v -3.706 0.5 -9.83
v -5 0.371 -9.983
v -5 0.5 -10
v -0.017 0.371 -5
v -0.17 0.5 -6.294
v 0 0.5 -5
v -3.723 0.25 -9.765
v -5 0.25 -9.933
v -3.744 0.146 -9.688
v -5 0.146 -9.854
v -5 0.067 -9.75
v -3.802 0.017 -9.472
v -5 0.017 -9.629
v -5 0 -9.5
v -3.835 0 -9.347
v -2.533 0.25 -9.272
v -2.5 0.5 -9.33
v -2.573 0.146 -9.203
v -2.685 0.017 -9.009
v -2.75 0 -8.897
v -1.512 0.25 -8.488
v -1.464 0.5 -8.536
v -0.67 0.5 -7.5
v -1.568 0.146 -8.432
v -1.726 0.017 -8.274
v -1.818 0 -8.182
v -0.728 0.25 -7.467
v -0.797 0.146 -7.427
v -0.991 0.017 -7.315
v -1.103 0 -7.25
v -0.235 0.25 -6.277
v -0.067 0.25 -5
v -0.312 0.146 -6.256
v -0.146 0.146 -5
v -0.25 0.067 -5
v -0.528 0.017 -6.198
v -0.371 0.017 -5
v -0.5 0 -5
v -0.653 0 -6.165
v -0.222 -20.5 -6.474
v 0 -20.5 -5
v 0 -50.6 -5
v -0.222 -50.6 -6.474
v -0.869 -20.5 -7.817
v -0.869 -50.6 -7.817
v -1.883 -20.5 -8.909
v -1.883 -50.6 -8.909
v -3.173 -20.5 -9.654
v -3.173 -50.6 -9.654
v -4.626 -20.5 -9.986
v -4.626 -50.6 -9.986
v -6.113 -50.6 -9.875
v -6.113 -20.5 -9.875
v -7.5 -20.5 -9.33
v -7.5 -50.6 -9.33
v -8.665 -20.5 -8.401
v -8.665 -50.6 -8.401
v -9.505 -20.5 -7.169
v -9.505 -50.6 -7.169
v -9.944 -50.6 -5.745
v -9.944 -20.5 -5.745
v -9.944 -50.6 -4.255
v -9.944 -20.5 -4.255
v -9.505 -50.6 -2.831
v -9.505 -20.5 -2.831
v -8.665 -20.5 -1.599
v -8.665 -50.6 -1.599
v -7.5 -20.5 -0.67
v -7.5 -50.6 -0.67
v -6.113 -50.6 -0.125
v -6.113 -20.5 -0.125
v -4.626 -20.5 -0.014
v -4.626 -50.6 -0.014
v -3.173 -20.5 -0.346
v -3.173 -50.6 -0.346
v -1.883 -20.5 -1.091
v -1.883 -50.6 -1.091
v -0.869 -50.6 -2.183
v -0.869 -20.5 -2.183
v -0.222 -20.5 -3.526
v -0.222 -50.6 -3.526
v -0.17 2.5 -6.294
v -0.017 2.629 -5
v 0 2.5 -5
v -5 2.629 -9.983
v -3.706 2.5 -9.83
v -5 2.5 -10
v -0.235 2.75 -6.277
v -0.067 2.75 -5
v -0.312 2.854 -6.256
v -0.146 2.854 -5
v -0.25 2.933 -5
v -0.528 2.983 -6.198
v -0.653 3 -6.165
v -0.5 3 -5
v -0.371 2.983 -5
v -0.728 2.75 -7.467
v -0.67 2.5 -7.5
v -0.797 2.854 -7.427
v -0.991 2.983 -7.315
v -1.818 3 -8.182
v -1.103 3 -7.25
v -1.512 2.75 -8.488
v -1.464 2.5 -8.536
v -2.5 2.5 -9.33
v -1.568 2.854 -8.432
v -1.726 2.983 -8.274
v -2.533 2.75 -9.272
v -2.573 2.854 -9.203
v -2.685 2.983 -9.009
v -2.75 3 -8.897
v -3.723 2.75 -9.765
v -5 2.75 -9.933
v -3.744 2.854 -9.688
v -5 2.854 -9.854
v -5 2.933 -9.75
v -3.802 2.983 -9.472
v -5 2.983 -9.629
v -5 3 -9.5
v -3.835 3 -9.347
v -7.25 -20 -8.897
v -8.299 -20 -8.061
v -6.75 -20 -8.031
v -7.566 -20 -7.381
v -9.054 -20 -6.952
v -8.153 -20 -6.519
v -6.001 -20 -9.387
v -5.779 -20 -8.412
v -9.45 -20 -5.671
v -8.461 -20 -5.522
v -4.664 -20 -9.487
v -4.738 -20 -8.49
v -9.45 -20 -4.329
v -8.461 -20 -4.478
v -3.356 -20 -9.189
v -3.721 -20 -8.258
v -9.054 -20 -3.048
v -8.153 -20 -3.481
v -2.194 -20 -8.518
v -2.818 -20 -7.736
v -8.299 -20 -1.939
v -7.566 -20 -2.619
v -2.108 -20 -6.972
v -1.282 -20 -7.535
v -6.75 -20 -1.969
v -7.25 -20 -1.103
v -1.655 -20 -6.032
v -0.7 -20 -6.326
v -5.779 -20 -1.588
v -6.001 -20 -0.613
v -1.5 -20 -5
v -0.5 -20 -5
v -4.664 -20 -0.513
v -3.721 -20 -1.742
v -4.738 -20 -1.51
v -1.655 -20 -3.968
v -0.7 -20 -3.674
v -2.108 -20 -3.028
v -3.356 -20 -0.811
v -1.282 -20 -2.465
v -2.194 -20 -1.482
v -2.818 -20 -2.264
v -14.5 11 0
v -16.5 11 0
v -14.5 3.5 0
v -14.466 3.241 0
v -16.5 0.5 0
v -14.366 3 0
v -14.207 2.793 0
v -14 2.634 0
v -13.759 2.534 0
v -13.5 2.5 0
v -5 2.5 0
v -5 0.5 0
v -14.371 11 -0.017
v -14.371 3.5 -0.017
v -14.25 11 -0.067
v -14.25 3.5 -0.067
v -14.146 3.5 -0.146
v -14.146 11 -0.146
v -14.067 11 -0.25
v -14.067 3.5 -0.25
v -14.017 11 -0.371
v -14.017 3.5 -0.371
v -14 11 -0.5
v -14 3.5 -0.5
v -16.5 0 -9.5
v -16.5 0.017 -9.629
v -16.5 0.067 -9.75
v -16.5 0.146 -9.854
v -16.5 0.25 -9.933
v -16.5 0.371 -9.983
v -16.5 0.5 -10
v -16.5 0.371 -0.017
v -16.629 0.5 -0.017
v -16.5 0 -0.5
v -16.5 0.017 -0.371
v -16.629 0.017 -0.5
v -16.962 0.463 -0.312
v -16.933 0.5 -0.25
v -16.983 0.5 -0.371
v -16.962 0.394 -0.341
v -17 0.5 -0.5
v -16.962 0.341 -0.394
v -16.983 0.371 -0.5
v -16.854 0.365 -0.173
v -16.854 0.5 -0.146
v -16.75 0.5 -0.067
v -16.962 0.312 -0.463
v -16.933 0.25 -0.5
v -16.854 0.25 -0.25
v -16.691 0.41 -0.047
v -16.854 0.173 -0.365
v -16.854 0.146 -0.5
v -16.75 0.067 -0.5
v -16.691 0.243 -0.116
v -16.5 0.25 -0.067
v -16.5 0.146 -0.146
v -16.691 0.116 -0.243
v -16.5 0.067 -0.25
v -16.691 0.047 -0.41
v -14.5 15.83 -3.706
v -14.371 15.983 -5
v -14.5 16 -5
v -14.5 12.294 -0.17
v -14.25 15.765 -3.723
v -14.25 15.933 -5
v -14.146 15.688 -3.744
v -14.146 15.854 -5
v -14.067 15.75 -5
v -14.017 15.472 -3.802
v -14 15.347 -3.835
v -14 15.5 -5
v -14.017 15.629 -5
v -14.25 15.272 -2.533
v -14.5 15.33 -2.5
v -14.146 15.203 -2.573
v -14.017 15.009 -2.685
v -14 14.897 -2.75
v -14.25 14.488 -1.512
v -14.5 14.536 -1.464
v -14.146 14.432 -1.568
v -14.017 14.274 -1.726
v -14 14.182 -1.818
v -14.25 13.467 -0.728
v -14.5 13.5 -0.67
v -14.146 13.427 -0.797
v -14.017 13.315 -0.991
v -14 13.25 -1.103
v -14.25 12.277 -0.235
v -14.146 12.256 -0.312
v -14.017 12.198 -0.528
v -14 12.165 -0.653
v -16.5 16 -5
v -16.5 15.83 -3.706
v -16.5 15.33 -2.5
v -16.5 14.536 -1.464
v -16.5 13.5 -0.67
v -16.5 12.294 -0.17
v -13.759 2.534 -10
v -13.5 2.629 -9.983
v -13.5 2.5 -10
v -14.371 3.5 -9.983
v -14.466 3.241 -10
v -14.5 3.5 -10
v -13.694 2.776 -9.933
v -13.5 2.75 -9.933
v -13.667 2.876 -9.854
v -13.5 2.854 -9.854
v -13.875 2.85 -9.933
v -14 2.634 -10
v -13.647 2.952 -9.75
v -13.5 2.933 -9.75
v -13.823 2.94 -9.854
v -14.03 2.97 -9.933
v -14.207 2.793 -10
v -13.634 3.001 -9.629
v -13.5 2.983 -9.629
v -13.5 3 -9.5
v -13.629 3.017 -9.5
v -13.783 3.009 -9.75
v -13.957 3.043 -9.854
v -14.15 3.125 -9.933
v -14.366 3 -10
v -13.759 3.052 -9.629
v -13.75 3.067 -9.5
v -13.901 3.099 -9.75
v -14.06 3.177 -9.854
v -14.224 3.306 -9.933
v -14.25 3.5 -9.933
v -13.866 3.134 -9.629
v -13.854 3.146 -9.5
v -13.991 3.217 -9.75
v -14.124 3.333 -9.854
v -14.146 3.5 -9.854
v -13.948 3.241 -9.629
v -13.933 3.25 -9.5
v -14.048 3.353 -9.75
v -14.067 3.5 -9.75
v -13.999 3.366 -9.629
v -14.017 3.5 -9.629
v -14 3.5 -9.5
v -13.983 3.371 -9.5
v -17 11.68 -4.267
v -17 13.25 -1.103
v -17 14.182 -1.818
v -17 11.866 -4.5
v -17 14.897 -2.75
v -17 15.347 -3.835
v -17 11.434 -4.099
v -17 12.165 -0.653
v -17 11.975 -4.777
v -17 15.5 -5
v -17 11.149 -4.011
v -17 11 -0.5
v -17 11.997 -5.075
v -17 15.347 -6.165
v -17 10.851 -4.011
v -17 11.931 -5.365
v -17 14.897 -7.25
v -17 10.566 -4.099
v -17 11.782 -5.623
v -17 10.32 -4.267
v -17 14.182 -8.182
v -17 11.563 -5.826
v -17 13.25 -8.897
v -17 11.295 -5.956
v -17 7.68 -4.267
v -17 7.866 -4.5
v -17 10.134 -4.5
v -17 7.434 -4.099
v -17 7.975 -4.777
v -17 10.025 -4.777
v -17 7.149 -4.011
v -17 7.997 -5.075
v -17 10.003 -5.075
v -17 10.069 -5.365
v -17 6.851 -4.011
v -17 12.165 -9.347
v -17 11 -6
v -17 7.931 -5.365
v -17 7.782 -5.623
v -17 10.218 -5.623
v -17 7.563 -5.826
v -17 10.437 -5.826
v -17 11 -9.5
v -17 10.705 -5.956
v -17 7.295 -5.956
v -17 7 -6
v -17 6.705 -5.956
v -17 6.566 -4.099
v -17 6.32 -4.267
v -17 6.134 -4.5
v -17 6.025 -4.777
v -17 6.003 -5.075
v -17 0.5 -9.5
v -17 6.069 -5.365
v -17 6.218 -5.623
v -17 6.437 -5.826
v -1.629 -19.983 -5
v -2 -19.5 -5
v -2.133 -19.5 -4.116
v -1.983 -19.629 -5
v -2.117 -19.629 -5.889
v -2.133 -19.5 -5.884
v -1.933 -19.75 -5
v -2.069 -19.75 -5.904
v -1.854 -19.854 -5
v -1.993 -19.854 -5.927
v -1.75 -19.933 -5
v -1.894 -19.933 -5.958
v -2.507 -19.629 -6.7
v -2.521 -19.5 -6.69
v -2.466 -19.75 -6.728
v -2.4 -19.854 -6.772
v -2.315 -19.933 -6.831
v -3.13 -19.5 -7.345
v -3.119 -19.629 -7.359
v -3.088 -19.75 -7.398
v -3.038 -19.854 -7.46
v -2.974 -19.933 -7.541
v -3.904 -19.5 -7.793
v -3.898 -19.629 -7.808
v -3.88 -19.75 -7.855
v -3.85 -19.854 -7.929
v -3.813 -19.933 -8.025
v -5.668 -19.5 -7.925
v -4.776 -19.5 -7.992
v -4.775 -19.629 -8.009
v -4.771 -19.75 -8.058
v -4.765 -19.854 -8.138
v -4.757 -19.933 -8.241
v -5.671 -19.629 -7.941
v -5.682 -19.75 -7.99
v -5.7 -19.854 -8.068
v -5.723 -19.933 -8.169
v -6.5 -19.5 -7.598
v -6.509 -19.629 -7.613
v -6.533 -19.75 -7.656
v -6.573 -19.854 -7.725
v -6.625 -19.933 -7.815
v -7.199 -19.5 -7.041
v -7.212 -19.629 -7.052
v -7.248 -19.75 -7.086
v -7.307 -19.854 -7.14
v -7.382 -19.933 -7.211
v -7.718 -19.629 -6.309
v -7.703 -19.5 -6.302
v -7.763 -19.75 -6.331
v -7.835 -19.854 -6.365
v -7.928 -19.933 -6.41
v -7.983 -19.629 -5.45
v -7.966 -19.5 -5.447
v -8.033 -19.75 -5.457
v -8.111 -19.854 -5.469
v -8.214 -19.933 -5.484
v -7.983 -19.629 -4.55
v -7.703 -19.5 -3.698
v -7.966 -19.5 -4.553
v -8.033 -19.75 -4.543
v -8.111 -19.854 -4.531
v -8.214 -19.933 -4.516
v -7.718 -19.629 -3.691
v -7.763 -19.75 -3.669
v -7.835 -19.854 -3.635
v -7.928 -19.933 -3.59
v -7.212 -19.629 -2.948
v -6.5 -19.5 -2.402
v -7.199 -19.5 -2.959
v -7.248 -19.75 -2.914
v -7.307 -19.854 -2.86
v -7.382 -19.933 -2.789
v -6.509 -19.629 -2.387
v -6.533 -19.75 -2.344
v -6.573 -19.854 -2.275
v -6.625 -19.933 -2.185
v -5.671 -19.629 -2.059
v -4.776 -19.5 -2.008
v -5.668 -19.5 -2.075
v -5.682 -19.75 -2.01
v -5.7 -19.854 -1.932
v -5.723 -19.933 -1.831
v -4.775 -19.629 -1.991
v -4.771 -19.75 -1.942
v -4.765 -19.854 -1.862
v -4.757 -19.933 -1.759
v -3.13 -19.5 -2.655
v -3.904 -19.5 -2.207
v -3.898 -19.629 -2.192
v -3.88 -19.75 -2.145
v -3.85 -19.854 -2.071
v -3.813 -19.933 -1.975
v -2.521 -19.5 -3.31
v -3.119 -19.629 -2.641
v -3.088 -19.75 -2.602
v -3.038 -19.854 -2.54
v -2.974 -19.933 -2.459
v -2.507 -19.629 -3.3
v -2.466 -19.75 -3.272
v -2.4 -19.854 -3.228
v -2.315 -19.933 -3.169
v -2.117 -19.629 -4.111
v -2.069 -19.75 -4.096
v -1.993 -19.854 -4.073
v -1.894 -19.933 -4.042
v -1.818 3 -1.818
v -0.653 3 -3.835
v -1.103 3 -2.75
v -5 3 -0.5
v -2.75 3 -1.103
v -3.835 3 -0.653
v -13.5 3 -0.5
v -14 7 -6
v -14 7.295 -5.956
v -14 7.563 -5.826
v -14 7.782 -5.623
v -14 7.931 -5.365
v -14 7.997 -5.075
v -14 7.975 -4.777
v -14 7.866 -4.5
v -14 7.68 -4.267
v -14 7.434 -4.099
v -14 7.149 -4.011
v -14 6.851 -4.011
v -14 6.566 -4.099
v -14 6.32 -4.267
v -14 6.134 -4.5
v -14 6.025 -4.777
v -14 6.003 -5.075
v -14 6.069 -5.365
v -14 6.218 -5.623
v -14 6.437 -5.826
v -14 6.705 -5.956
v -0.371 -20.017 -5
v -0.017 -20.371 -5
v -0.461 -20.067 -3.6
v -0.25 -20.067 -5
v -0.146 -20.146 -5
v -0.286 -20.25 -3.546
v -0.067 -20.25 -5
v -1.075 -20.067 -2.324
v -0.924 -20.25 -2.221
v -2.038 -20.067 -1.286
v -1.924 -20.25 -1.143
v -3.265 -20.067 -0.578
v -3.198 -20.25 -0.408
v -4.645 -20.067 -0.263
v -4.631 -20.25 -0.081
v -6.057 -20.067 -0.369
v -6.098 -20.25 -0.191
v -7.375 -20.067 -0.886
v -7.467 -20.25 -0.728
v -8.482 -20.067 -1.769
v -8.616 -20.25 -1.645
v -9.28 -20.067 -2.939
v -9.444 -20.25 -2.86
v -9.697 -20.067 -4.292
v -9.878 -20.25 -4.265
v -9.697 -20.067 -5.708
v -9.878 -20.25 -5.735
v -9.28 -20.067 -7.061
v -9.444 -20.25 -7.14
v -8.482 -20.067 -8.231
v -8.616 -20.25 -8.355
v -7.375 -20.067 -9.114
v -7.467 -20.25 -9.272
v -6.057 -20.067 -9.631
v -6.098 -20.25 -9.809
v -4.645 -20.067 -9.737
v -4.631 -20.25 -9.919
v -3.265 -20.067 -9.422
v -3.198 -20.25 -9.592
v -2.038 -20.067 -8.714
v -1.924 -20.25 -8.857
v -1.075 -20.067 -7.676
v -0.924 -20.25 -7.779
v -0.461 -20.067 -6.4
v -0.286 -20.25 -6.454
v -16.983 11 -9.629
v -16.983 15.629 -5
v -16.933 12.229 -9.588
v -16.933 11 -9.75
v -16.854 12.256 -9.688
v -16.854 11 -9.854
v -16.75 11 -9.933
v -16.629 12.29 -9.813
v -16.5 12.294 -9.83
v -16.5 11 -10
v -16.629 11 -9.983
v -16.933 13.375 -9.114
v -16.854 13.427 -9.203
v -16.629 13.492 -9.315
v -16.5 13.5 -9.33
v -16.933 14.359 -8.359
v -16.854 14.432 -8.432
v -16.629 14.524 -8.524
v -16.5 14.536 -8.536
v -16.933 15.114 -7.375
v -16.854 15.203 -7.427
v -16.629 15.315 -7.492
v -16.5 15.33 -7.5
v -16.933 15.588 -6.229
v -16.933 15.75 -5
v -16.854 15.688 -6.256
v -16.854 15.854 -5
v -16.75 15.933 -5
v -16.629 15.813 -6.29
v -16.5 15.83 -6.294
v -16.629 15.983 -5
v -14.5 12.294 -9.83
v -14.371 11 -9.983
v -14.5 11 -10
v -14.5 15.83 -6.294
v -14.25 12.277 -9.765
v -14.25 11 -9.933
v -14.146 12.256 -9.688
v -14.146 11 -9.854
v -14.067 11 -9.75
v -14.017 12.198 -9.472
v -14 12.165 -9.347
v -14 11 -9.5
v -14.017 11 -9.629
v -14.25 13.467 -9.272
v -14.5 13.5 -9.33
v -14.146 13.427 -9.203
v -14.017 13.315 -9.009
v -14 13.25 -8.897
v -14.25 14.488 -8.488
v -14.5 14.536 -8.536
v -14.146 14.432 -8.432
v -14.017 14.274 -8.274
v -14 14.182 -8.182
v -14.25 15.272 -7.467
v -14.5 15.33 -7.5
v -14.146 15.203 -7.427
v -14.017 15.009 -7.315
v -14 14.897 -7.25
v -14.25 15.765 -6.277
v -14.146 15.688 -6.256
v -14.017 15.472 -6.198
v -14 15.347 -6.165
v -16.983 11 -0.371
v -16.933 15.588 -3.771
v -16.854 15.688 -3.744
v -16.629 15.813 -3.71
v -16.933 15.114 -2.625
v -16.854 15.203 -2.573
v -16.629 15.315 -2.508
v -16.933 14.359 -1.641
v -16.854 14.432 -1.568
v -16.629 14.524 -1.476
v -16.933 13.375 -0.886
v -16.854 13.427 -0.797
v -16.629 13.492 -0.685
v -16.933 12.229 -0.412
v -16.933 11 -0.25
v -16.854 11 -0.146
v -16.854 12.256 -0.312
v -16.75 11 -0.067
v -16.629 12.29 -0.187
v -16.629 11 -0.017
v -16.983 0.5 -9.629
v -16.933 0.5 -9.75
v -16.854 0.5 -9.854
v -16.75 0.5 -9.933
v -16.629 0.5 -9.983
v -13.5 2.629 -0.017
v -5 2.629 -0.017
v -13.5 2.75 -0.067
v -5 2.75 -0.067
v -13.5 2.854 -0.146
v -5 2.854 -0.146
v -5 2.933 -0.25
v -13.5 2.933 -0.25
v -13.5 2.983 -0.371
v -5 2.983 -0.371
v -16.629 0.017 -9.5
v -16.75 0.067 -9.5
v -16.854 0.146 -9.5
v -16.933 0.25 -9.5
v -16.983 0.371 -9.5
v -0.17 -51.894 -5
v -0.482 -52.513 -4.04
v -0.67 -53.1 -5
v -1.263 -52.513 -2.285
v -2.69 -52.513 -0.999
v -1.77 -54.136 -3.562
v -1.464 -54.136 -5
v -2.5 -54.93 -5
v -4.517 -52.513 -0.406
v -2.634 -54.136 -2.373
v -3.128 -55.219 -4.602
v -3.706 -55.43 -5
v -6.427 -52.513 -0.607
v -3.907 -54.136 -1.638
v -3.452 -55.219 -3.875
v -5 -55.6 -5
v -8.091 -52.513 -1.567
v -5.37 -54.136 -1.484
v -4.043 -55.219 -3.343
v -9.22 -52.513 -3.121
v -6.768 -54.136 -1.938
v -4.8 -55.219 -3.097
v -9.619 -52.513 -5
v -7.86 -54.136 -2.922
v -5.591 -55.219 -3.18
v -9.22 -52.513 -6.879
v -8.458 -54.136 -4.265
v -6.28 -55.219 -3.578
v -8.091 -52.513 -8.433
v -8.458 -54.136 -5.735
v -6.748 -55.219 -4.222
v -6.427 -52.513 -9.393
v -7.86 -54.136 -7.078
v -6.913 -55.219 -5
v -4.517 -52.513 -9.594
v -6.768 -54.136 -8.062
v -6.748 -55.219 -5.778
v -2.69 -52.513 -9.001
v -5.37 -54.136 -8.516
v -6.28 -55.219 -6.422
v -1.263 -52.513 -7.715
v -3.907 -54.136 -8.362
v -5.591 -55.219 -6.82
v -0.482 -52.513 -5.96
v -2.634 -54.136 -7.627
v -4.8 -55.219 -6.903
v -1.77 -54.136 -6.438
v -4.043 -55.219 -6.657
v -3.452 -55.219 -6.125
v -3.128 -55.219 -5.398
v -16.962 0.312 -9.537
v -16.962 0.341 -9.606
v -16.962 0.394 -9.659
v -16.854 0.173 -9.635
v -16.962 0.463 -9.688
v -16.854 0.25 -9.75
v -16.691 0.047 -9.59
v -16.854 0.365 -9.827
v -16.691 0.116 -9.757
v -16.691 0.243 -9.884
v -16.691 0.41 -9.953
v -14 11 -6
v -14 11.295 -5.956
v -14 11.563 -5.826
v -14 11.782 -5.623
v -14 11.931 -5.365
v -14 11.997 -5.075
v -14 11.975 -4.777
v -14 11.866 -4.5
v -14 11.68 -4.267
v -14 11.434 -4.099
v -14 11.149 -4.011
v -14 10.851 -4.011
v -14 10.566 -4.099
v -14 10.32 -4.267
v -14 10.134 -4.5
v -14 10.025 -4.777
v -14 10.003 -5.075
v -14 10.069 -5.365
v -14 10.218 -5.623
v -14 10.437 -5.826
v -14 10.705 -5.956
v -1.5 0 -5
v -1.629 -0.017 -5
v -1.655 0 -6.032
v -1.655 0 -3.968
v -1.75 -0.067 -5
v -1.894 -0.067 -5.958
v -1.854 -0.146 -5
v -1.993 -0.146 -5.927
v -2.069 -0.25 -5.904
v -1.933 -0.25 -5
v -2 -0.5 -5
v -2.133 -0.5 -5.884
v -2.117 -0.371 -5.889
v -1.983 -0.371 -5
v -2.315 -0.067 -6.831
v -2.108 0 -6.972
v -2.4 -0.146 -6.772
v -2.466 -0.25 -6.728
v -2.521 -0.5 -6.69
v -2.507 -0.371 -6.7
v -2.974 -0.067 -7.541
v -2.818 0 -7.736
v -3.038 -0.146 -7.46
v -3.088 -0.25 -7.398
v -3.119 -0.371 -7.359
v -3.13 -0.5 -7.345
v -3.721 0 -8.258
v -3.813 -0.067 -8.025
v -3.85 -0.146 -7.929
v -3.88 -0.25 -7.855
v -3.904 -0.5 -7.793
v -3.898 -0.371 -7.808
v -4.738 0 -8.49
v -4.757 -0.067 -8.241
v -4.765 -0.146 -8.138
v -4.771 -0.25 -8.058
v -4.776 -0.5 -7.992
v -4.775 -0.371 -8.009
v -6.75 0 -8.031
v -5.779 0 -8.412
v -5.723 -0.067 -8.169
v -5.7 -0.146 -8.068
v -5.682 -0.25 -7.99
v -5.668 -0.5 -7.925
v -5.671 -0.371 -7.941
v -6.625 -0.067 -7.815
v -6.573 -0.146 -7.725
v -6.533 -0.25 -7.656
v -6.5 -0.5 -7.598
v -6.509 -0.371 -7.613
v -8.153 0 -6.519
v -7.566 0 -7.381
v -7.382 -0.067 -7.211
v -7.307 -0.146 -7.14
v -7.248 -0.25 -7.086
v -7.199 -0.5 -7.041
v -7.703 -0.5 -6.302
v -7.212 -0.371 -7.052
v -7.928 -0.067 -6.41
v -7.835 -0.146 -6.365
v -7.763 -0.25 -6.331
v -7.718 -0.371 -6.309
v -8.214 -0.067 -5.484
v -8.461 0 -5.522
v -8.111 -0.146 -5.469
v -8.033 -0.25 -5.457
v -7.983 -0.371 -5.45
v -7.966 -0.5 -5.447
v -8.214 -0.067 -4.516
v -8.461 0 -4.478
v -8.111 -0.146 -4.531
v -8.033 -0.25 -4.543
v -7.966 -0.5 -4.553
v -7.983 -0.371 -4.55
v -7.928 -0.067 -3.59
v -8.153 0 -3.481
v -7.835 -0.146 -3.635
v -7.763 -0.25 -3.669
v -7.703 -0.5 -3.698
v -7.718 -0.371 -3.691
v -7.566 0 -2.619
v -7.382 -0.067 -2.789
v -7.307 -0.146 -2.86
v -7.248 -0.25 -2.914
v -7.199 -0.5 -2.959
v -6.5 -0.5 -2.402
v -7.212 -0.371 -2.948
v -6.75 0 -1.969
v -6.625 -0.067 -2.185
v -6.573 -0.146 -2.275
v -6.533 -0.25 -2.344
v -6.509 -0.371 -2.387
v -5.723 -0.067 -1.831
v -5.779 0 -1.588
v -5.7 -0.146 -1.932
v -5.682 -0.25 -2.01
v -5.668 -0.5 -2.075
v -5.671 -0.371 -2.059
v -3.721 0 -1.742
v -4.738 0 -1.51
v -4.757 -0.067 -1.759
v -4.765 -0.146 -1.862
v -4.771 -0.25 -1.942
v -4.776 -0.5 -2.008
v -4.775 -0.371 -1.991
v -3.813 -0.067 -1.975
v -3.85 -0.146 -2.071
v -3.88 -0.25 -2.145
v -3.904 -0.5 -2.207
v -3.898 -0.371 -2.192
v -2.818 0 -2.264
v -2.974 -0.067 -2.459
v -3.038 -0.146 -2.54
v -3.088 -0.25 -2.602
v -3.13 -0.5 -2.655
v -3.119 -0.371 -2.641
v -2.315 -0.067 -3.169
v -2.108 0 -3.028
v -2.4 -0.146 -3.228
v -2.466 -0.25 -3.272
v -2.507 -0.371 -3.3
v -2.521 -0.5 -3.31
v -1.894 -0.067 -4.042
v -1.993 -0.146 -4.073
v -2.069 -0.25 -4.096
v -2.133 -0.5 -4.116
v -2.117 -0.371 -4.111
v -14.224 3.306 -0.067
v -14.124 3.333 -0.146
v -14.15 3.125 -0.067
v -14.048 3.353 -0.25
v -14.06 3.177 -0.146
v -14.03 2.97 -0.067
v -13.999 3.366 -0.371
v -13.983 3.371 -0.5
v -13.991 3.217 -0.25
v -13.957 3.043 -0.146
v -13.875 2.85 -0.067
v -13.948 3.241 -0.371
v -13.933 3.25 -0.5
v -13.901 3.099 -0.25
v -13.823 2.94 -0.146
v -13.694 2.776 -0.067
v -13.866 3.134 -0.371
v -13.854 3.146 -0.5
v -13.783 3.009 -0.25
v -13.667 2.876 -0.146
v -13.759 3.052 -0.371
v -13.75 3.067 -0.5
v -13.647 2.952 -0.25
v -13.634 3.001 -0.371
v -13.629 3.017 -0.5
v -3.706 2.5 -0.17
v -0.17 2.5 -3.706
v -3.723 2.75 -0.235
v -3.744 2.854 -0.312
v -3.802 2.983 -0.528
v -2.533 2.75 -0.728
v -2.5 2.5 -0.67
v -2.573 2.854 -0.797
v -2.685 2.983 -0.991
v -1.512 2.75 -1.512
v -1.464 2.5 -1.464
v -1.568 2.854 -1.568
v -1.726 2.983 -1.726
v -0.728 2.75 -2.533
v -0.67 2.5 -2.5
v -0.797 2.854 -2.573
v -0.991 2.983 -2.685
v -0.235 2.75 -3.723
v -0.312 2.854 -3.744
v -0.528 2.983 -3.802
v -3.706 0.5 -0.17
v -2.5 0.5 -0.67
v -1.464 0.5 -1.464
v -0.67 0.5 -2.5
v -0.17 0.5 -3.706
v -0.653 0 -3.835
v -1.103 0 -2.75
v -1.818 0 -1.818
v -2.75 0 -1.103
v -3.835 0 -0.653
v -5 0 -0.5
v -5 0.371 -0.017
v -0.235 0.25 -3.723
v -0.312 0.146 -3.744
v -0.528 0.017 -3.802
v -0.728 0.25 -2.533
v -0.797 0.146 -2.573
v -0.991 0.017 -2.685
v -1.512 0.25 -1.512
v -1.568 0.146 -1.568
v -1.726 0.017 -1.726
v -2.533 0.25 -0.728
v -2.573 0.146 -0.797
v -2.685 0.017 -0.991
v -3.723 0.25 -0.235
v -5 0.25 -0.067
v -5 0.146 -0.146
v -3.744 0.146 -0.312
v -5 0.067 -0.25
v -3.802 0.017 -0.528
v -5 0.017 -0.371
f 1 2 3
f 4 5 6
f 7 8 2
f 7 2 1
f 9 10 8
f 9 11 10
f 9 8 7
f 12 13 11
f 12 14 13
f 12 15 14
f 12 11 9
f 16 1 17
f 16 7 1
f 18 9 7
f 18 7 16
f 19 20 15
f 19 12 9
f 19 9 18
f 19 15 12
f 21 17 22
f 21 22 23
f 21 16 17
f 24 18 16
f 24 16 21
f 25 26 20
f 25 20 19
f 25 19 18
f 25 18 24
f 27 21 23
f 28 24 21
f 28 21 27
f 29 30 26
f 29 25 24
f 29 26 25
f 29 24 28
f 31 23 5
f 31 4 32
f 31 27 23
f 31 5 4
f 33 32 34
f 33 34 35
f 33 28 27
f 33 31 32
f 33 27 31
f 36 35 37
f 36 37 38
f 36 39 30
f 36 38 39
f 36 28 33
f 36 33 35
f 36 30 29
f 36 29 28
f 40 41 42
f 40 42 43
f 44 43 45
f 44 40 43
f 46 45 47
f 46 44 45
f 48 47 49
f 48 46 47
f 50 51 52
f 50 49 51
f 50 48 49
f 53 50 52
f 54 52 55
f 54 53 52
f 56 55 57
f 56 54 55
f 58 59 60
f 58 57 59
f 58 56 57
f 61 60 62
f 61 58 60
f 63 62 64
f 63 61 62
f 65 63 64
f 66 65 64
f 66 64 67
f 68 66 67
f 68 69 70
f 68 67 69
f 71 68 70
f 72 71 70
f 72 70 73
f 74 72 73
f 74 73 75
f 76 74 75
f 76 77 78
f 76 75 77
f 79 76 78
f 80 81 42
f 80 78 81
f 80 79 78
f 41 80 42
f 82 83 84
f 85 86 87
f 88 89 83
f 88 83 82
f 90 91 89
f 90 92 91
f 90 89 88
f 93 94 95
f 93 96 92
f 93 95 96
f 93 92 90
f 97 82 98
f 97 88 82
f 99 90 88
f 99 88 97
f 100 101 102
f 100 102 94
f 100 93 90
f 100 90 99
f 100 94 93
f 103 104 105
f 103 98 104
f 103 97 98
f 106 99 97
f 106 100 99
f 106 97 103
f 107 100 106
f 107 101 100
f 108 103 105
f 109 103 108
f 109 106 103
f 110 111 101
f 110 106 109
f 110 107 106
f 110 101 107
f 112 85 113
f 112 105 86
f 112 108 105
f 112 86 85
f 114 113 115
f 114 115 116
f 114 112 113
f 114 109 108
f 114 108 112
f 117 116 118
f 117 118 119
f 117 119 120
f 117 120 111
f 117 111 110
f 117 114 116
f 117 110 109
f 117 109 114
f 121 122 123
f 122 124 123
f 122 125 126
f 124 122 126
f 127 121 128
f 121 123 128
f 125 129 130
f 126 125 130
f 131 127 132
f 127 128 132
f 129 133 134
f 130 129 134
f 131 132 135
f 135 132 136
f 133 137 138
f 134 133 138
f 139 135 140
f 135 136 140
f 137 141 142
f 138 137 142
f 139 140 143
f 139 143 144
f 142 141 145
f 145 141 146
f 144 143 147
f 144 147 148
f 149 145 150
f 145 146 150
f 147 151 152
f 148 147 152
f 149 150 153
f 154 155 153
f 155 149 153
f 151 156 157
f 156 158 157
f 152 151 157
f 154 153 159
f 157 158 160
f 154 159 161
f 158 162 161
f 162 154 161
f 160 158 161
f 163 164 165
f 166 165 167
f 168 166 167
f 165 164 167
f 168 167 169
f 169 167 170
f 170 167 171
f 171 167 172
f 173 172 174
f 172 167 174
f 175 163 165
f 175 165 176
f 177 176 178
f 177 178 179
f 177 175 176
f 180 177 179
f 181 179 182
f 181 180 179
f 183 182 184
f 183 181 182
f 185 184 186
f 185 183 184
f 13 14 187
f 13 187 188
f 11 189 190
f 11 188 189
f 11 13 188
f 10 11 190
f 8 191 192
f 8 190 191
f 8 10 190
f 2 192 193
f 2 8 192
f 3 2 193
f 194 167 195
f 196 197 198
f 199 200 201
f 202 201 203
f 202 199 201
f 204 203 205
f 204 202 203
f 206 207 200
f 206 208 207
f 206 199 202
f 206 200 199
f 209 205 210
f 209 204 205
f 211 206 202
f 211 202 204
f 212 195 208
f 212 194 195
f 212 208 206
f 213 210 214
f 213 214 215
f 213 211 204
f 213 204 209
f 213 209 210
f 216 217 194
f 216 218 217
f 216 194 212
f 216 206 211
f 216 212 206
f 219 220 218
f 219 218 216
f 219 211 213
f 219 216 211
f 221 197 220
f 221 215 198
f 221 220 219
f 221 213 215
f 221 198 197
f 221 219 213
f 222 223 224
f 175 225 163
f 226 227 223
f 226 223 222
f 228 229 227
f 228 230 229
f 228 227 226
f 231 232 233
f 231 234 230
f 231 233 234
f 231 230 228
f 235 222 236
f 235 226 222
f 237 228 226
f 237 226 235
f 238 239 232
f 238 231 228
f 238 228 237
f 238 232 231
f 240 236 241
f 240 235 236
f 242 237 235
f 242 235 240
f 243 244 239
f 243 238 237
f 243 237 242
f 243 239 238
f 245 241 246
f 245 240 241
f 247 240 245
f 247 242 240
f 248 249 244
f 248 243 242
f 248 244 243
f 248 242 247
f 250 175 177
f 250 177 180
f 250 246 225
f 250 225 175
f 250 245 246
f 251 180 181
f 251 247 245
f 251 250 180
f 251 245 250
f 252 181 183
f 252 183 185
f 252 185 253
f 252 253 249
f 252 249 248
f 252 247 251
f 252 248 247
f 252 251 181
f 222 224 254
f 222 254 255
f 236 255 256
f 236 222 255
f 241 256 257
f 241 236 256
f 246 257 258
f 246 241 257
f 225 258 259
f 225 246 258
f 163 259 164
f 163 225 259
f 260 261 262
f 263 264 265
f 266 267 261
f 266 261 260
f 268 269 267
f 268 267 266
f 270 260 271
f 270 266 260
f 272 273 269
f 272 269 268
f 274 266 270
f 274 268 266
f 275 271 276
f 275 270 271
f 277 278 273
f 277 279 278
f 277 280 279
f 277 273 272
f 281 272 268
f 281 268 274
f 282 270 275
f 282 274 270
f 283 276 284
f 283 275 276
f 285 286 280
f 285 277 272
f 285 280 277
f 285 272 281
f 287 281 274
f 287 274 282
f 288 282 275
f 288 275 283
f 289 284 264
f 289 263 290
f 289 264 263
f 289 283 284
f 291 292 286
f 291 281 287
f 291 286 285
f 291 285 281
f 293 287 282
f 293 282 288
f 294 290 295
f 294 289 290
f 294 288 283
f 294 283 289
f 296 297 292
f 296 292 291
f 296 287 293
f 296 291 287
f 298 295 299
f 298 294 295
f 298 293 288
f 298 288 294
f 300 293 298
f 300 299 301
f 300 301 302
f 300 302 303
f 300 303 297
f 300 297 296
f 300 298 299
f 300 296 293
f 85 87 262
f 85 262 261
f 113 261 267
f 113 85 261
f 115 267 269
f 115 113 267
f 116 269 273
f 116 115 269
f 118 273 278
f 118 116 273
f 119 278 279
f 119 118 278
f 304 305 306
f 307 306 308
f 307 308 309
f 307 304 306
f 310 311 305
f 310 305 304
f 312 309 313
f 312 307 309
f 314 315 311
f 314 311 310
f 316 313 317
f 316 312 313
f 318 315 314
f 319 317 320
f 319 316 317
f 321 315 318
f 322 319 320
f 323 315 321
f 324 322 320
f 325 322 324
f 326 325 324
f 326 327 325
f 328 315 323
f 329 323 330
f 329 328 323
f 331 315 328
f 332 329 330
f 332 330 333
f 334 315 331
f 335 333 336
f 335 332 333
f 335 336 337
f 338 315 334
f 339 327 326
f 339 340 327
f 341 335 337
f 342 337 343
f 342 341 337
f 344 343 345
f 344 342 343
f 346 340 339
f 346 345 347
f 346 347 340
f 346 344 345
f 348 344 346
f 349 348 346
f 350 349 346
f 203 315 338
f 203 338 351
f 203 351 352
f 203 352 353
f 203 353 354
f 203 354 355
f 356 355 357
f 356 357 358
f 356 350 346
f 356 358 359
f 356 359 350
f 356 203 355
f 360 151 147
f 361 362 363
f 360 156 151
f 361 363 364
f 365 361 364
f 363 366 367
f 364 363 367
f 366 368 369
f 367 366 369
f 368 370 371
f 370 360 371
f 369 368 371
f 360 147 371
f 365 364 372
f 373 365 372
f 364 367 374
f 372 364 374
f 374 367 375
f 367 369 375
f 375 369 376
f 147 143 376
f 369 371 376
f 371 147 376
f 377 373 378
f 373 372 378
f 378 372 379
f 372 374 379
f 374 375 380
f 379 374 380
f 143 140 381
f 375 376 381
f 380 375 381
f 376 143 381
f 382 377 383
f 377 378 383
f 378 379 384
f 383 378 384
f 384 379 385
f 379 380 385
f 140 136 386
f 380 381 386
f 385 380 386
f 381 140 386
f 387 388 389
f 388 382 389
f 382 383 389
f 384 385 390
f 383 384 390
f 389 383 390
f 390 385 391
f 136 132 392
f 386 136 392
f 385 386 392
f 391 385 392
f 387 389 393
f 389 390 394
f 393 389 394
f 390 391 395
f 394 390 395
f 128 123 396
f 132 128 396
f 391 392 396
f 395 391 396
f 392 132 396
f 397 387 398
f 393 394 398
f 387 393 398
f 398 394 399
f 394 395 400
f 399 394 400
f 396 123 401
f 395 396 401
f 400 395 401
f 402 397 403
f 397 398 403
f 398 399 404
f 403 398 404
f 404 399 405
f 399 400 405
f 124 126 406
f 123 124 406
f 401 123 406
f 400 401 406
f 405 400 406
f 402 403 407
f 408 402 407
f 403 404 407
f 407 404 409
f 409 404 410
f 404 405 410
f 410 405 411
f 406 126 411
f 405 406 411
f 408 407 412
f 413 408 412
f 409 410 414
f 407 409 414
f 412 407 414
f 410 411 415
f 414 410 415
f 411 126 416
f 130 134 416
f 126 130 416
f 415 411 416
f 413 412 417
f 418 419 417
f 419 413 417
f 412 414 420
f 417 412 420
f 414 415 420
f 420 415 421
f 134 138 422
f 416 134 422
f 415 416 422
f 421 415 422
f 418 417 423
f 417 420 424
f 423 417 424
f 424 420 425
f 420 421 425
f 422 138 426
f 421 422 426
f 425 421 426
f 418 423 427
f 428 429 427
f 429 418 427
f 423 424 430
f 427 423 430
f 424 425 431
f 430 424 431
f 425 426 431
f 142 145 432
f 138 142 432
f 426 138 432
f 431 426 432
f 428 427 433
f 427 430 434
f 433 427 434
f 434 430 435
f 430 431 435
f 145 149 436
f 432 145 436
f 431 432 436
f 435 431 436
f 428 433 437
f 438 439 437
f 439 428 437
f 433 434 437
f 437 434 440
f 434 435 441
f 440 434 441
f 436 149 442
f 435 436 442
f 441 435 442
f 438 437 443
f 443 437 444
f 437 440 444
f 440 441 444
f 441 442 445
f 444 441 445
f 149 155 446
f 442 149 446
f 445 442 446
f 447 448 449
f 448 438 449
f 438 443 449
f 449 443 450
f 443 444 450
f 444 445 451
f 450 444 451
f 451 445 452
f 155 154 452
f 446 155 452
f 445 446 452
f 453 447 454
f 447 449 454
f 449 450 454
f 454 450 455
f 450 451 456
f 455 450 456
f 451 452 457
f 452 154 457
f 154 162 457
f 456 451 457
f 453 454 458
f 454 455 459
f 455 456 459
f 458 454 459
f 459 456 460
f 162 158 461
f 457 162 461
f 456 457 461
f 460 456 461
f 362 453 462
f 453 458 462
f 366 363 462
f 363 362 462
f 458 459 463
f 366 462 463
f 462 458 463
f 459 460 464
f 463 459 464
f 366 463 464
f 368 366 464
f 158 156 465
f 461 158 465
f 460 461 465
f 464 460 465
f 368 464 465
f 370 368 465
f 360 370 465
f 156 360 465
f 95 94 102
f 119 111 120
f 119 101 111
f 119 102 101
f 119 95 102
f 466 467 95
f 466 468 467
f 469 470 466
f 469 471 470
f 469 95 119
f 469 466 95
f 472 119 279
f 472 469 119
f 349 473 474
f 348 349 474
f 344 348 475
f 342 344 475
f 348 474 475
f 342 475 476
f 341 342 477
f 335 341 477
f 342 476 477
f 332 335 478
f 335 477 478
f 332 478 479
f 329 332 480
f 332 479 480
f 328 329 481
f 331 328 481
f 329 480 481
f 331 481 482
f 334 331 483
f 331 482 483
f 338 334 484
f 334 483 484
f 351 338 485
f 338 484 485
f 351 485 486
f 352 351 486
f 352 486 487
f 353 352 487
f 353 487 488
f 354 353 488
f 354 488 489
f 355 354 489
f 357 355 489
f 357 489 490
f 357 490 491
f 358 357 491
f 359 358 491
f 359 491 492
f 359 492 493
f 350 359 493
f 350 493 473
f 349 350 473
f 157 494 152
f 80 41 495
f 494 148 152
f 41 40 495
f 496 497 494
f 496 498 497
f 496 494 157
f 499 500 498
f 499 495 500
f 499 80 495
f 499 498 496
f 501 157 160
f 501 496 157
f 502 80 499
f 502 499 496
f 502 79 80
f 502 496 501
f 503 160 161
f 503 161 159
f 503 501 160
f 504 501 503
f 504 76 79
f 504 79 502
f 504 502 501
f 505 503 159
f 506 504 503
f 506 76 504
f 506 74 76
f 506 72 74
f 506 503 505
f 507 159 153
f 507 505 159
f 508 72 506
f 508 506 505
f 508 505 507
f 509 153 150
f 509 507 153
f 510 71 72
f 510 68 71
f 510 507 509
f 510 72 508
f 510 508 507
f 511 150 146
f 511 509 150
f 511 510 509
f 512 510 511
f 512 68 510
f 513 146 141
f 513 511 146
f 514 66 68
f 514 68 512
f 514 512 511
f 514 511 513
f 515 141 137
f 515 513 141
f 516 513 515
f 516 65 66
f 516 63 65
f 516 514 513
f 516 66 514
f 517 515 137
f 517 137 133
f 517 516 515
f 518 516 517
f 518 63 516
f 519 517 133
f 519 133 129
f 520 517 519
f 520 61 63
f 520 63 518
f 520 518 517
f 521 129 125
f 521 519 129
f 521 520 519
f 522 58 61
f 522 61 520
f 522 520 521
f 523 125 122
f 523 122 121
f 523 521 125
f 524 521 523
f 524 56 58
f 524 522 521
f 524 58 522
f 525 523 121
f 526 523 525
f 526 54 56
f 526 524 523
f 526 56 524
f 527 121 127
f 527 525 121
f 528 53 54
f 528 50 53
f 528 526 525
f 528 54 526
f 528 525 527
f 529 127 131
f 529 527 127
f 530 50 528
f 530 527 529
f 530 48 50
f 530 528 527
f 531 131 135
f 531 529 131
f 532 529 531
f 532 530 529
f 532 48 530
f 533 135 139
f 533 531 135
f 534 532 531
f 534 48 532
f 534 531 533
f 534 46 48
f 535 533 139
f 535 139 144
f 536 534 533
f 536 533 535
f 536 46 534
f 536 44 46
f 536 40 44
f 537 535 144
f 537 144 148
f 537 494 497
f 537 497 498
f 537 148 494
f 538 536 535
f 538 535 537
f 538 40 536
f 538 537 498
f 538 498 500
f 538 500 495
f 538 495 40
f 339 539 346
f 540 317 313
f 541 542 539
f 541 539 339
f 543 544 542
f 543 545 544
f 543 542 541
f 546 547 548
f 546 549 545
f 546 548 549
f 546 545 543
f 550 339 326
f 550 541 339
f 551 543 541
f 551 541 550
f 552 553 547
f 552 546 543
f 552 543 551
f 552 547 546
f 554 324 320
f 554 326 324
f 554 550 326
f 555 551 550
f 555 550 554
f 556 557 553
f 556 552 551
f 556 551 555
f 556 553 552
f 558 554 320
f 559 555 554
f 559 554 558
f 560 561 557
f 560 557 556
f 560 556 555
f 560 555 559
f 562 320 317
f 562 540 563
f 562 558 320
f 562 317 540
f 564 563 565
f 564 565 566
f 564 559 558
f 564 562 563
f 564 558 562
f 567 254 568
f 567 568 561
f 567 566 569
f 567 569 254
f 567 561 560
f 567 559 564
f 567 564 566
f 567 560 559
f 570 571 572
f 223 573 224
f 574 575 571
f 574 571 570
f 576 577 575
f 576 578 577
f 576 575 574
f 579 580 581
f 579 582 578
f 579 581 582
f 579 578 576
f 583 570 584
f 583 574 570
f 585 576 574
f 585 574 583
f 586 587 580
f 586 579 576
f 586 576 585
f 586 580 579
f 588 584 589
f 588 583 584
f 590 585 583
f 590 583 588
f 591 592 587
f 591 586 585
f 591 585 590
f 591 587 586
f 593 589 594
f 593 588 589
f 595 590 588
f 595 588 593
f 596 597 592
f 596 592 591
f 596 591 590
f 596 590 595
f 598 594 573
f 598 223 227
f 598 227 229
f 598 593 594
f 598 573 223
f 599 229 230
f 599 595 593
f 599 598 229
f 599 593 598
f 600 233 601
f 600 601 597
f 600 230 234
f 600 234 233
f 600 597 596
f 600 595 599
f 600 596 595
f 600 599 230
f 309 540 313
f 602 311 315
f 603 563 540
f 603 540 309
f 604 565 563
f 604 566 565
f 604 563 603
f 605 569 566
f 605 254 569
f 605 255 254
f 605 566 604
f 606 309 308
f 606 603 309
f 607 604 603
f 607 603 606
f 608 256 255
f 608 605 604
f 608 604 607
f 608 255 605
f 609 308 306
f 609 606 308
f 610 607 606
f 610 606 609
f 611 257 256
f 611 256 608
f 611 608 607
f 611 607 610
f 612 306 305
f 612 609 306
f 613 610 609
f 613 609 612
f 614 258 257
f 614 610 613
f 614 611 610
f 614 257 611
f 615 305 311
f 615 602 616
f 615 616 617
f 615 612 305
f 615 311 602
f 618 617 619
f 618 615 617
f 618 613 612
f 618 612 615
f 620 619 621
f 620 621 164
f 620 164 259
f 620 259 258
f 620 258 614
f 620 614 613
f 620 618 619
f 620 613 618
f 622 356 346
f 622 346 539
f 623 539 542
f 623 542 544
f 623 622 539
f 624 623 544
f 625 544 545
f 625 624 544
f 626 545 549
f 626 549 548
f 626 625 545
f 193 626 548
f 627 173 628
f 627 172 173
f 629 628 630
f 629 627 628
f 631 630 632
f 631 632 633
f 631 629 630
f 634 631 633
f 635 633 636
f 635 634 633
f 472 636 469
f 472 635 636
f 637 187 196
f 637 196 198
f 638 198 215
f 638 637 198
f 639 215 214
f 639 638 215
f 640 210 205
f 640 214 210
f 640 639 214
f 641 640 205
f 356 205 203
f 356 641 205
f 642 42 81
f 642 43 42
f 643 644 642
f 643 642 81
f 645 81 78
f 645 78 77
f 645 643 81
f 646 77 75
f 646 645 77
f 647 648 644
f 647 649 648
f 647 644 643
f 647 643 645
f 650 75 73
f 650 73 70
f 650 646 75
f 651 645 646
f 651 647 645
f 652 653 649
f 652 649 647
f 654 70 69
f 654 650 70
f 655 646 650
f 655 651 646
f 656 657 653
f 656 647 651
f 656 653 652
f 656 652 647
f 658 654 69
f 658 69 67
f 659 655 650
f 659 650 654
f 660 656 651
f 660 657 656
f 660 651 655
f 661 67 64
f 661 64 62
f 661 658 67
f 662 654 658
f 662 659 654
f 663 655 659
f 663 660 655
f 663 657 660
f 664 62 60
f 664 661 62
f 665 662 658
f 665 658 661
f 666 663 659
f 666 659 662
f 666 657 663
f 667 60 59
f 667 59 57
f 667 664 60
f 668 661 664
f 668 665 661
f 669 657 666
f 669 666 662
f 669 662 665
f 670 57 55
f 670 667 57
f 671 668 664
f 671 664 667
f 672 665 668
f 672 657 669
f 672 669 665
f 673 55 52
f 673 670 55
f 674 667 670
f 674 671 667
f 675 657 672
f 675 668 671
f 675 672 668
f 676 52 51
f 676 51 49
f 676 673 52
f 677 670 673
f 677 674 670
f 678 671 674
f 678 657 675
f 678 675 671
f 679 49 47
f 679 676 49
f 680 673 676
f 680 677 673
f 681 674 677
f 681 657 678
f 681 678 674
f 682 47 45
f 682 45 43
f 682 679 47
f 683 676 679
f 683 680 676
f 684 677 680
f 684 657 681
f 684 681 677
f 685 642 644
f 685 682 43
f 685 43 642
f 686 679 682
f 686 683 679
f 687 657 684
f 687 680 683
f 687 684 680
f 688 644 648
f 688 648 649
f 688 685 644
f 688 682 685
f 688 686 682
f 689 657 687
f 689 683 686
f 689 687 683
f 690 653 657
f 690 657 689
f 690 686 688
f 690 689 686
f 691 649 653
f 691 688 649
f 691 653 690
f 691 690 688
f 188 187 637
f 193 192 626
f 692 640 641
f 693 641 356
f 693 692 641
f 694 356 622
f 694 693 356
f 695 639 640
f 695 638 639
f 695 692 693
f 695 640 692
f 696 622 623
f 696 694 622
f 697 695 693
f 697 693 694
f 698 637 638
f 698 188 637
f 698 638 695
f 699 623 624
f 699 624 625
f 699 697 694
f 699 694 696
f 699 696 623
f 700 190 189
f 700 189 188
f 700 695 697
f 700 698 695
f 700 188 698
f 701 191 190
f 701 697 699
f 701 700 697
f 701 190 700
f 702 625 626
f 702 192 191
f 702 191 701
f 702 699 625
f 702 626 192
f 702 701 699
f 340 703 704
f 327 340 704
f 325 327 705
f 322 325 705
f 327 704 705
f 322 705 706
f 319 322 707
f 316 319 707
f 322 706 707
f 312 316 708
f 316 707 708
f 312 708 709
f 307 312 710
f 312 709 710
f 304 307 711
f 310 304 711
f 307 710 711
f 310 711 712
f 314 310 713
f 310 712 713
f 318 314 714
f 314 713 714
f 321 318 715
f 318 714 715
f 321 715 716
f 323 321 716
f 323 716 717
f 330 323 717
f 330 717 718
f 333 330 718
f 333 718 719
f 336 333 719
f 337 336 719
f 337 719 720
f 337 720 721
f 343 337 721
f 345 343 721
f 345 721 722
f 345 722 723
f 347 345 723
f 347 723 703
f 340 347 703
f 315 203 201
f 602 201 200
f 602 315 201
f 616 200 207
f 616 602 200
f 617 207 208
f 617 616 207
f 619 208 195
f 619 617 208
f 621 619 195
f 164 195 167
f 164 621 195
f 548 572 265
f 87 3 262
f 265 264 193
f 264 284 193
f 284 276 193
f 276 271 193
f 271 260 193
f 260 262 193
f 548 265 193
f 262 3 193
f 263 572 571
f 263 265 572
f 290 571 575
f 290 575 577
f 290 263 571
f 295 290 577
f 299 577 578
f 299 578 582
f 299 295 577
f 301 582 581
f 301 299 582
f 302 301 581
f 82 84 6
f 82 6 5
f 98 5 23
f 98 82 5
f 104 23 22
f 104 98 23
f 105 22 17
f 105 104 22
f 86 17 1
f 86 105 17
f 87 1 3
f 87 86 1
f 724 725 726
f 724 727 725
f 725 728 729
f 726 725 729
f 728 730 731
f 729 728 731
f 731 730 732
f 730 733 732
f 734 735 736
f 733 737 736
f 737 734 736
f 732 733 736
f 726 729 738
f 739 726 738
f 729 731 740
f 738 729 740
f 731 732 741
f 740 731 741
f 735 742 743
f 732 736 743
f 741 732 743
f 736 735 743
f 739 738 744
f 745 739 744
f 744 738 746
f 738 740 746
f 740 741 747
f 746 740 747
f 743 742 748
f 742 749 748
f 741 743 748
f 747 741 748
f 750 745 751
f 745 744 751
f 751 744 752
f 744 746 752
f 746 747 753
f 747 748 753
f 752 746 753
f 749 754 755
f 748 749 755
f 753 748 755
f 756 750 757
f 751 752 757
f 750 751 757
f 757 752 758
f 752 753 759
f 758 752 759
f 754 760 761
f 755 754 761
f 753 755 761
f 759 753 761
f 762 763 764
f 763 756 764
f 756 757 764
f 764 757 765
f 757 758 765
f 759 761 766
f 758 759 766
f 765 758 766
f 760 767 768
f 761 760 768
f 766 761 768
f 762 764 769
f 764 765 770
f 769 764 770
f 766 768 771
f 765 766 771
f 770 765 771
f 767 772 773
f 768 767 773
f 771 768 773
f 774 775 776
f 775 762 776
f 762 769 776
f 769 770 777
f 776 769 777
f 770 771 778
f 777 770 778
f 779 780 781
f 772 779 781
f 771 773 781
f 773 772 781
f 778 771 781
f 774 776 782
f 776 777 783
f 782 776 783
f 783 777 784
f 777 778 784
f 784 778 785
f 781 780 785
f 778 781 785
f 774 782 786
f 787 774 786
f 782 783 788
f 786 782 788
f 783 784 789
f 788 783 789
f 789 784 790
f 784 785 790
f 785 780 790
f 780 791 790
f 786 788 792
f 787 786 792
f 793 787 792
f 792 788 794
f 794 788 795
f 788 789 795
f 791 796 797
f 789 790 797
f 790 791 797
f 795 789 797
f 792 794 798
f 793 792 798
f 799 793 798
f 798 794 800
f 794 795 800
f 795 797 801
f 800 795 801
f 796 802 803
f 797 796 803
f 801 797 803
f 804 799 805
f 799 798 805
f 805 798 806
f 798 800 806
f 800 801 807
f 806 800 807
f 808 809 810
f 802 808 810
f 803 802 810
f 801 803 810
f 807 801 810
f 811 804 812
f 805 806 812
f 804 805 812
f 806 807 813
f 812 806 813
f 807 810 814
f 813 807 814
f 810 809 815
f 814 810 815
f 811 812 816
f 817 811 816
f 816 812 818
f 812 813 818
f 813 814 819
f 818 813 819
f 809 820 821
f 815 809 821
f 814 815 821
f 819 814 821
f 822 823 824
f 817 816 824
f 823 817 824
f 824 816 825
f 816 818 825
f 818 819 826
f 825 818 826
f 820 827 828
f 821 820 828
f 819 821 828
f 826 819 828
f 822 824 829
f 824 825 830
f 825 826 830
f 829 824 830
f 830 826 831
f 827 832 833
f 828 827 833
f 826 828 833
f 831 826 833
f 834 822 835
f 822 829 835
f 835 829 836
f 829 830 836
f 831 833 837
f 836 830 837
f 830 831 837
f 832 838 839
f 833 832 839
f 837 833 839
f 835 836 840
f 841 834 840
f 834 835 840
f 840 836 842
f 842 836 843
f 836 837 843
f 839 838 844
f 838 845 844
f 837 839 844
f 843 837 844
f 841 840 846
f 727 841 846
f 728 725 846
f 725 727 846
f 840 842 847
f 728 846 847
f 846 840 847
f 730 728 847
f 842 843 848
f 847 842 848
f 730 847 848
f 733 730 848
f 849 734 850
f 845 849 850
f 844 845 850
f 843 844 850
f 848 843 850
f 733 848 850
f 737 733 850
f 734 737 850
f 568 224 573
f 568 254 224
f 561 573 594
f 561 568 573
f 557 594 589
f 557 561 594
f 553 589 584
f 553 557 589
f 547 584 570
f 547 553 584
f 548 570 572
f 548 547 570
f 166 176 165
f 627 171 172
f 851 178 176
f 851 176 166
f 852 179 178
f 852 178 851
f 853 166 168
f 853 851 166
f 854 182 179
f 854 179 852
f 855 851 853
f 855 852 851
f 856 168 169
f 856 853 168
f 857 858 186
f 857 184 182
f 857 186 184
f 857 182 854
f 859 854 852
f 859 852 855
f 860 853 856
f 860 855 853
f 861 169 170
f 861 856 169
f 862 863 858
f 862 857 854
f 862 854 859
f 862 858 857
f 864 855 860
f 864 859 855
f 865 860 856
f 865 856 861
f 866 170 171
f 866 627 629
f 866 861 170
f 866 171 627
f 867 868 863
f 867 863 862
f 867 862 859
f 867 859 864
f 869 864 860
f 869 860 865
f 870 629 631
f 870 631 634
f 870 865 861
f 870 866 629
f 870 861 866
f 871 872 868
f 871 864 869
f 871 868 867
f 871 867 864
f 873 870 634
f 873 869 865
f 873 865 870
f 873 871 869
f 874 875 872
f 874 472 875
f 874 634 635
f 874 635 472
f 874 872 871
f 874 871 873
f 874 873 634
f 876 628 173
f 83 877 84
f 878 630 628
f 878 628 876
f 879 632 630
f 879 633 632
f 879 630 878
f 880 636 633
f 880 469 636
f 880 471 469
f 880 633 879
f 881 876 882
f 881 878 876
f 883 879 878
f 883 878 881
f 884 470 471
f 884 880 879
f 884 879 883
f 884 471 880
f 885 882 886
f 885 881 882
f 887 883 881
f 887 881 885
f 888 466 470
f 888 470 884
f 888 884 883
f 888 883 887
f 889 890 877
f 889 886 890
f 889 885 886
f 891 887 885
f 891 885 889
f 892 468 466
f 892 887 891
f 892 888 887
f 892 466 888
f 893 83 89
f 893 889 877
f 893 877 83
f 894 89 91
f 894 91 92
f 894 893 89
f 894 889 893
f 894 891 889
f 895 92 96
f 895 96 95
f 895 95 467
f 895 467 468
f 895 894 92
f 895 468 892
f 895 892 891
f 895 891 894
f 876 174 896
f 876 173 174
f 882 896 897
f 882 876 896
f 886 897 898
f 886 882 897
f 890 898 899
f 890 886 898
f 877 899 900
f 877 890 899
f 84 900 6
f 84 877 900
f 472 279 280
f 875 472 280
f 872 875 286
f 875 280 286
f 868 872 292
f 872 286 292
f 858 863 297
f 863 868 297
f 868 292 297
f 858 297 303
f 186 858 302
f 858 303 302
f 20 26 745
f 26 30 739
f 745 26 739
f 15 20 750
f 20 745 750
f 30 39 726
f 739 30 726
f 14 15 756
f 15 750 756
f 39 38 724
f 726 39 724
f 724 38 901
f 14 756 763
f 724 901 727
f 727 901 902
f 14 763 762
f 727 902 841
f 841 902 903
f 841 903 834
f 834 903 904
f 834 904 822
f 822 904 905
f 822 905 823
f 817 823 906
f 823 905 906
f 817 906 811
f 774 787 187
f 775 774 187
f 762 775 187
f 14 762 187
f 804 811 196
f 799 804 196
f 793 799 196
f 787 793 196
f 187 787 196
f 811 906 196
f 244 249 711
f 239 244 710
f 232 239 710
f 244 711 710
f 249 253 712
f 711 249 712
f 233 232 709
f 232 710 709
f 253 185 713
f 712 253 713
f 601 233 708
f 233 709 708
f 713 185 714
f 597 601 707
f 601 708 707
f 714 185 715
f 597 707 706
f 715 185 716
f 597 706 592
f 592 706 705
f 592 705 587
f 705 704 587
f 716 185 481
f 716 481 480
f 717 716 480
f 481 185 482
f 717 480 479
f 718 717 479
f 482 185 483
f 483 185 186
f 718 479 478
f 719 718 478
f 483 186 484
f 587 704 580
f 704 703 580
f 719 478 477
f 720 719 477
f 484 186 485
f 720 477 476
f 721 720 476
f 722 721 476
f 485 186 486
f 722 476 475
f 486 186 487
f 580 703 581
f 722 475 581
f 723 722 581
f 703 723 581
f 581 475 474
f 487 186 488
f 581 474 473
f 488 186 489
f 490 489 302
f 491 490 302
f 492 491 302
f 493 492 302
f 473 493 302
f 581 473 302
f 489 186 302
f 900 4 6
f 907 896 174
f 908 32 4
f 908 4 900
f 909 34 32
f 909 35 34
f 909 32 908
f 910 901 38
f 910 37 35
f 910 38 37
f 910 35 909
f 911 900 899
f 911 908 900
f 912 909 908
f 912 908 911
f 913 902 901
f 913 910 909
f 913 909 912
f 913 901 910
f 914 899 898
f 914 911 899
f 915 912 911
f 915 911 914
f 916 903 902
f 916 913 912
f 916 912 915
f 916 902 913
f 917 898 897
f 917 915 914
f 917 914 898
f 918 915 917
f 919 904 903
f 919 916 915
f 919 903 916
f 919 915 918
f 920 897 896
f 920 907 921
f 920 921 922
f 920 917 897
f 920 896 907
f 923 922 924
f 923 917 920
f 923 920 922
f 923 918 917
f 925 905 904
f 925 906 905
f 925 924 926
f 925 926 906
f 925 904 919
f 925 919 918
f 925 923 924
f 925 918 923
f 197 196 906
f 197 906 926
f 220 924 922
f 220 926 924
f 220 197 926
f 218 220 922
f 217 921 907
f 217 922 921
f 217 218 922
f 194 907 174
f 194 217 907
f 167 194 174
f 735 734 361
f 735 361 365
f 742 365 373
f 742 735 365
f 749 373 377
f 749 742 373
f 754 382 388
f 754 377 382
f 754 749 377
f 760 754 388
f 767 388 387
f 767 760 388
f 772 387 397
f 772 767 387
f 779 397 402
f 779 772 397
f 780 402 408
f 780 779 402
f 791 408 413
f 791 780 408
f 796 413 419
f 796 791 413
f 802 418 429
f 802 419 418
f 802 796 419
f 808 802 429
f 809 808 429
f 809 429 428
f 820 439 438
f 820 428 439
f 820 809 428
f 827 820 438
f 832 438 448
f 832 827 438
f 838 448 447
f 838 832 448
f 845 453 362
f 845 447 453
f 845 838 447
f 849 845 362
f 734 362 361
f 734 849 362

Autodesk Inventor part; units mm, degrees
ref_plane "YZ Plane" through (0, 0, 0) normal (1, 0, 0) x (0, 1, 0)
ref_plane "XZ Plane" through (0, 0, 0) normal (0, 1, 0) x (-1, 0, 0)
ref_plane "XY Plane" through (0, 0, 0) normal (0, 0, 1) x (1, 0, 0)
sketch "Sketch2" plane through (0, 0, 0) normal (0, 1, 0) x (-1, 0, 0)
  line L0 (0, 0) -> (17, 0)
  line L1 (17, 0) -> (17, -10)
  line L2 (17, -10) -> (0, -10)
  line L3 (0, -10) -> (0, 0)
  line L4 (17, 0) -> (14, 0)
  line L5 (14, -10) -> (17, -10)
  line L6 (17, -10) -> (17, 0)
  dimension "d2" = 17
  dimension "d3" = 10
extrude "Extrusion1" add sketch "Sketch2" along normal blind 3
fillet "Fillet1" radius 5 2 edges at (0, 1.5, -10) (0, 1.5, 0)
sketch "Sketch5" plane through (0, 0, 0) normal (0, -1, 0) x (1, 0, 0)
  circle A0 centre (-5, -5) radius 3
  line L0 (-17, 0) -> (-5, 0) projected
  arc A1 (-5, -10) -> (-5, 0) centre (-5, -5) ccw projected
  point P0 (0, 0)
  dimension "d19" = 6
  dimension "d20" = 5
  dimension "d21" = 0
extrude "Extrusion4" add sketch "Sketch5" along normal blind 20
sketch "Sketch6" plane through (-5, -20, -5) normal (0, -1, 0) x (1, 0, 0)
  circle A0 centre (0, 0) radius 5
  point P0 (5, 5)
  dimension "d24" = 10
extrude "Extrusion5" add sketch "Sketch6" along normal blind 35.6
fillet "Fillet2" radius 5 1 edges at (-10, -55.6, -5)
sketch "Sketch7" plane through (0, 3, 0) normal (0, 1, 0) x (1, 0, 0)
  line L0 (-17, 0) -> (-17, 10) projected
  line L1 (-17, 0) -> (-14, 0)
  line L2 (-14, 0) -> (-14, 10)
  line L3 (-14, 10) -> (-17, 10)
  line L4 (-17, 10) -> (-17, 0)
  point P0 (0, 0)
  dimension "d29" = 3
  dimension "d30" = 10
extrude "Extrusion6" add sketch "Sketch7" along normal blind 13
fillet "Fillet4" radius 5 2 edges at (-15.5, 16, 0) (-15.5, 16, -10)
sketch "Sketch8" plane through (-14, 3, 0) normal (1, 0, 0) x (0, 0, -1)
  circle A0 centre (5, 8) radius 1
  circle A1 centre (5, 4) radius 1
  arc A2 (10, 8) -> (0, 8) centre (5, 8) ccw projected
  line L0 (0, 0) -> (0, 8) projected
  line L1 (10, 0) -> (10, 8) projected
  point P0 (0, -3)
  dimension "d34" = 2
  dimension "d35" = 2
  dimension "d36" = 0
  dimension "d37" = 4
  dimension "d38" = 5
  dimension "d39" = 5
  dimension "d40" = 10
  dimension "d41" = 5
extrude "Extrusion7" cut sketch "Sketch8" against normal blind 3
fillet "Fillet5" radius 0.5 17 edges at (-10, -20, -5) (-8, -20, -5) (-11, 0, -10) (-11, 0, 0) (-1.4644, 0, -8.5356) (-8, 0, -5) (-9.5, 3, 0) (-9.5, 3, -10) (-1.4644, 3, -8.5356) (-14, 3, -5) (-14, 14.5356, -1.4644) (-14, 7, 0) (-14, 7, -10) (-17, 5.5, 0) (-17, 5.5, -10) (-17, 14.5356, -1.4644) (-17, 0, -5)
properties part number "toe"
